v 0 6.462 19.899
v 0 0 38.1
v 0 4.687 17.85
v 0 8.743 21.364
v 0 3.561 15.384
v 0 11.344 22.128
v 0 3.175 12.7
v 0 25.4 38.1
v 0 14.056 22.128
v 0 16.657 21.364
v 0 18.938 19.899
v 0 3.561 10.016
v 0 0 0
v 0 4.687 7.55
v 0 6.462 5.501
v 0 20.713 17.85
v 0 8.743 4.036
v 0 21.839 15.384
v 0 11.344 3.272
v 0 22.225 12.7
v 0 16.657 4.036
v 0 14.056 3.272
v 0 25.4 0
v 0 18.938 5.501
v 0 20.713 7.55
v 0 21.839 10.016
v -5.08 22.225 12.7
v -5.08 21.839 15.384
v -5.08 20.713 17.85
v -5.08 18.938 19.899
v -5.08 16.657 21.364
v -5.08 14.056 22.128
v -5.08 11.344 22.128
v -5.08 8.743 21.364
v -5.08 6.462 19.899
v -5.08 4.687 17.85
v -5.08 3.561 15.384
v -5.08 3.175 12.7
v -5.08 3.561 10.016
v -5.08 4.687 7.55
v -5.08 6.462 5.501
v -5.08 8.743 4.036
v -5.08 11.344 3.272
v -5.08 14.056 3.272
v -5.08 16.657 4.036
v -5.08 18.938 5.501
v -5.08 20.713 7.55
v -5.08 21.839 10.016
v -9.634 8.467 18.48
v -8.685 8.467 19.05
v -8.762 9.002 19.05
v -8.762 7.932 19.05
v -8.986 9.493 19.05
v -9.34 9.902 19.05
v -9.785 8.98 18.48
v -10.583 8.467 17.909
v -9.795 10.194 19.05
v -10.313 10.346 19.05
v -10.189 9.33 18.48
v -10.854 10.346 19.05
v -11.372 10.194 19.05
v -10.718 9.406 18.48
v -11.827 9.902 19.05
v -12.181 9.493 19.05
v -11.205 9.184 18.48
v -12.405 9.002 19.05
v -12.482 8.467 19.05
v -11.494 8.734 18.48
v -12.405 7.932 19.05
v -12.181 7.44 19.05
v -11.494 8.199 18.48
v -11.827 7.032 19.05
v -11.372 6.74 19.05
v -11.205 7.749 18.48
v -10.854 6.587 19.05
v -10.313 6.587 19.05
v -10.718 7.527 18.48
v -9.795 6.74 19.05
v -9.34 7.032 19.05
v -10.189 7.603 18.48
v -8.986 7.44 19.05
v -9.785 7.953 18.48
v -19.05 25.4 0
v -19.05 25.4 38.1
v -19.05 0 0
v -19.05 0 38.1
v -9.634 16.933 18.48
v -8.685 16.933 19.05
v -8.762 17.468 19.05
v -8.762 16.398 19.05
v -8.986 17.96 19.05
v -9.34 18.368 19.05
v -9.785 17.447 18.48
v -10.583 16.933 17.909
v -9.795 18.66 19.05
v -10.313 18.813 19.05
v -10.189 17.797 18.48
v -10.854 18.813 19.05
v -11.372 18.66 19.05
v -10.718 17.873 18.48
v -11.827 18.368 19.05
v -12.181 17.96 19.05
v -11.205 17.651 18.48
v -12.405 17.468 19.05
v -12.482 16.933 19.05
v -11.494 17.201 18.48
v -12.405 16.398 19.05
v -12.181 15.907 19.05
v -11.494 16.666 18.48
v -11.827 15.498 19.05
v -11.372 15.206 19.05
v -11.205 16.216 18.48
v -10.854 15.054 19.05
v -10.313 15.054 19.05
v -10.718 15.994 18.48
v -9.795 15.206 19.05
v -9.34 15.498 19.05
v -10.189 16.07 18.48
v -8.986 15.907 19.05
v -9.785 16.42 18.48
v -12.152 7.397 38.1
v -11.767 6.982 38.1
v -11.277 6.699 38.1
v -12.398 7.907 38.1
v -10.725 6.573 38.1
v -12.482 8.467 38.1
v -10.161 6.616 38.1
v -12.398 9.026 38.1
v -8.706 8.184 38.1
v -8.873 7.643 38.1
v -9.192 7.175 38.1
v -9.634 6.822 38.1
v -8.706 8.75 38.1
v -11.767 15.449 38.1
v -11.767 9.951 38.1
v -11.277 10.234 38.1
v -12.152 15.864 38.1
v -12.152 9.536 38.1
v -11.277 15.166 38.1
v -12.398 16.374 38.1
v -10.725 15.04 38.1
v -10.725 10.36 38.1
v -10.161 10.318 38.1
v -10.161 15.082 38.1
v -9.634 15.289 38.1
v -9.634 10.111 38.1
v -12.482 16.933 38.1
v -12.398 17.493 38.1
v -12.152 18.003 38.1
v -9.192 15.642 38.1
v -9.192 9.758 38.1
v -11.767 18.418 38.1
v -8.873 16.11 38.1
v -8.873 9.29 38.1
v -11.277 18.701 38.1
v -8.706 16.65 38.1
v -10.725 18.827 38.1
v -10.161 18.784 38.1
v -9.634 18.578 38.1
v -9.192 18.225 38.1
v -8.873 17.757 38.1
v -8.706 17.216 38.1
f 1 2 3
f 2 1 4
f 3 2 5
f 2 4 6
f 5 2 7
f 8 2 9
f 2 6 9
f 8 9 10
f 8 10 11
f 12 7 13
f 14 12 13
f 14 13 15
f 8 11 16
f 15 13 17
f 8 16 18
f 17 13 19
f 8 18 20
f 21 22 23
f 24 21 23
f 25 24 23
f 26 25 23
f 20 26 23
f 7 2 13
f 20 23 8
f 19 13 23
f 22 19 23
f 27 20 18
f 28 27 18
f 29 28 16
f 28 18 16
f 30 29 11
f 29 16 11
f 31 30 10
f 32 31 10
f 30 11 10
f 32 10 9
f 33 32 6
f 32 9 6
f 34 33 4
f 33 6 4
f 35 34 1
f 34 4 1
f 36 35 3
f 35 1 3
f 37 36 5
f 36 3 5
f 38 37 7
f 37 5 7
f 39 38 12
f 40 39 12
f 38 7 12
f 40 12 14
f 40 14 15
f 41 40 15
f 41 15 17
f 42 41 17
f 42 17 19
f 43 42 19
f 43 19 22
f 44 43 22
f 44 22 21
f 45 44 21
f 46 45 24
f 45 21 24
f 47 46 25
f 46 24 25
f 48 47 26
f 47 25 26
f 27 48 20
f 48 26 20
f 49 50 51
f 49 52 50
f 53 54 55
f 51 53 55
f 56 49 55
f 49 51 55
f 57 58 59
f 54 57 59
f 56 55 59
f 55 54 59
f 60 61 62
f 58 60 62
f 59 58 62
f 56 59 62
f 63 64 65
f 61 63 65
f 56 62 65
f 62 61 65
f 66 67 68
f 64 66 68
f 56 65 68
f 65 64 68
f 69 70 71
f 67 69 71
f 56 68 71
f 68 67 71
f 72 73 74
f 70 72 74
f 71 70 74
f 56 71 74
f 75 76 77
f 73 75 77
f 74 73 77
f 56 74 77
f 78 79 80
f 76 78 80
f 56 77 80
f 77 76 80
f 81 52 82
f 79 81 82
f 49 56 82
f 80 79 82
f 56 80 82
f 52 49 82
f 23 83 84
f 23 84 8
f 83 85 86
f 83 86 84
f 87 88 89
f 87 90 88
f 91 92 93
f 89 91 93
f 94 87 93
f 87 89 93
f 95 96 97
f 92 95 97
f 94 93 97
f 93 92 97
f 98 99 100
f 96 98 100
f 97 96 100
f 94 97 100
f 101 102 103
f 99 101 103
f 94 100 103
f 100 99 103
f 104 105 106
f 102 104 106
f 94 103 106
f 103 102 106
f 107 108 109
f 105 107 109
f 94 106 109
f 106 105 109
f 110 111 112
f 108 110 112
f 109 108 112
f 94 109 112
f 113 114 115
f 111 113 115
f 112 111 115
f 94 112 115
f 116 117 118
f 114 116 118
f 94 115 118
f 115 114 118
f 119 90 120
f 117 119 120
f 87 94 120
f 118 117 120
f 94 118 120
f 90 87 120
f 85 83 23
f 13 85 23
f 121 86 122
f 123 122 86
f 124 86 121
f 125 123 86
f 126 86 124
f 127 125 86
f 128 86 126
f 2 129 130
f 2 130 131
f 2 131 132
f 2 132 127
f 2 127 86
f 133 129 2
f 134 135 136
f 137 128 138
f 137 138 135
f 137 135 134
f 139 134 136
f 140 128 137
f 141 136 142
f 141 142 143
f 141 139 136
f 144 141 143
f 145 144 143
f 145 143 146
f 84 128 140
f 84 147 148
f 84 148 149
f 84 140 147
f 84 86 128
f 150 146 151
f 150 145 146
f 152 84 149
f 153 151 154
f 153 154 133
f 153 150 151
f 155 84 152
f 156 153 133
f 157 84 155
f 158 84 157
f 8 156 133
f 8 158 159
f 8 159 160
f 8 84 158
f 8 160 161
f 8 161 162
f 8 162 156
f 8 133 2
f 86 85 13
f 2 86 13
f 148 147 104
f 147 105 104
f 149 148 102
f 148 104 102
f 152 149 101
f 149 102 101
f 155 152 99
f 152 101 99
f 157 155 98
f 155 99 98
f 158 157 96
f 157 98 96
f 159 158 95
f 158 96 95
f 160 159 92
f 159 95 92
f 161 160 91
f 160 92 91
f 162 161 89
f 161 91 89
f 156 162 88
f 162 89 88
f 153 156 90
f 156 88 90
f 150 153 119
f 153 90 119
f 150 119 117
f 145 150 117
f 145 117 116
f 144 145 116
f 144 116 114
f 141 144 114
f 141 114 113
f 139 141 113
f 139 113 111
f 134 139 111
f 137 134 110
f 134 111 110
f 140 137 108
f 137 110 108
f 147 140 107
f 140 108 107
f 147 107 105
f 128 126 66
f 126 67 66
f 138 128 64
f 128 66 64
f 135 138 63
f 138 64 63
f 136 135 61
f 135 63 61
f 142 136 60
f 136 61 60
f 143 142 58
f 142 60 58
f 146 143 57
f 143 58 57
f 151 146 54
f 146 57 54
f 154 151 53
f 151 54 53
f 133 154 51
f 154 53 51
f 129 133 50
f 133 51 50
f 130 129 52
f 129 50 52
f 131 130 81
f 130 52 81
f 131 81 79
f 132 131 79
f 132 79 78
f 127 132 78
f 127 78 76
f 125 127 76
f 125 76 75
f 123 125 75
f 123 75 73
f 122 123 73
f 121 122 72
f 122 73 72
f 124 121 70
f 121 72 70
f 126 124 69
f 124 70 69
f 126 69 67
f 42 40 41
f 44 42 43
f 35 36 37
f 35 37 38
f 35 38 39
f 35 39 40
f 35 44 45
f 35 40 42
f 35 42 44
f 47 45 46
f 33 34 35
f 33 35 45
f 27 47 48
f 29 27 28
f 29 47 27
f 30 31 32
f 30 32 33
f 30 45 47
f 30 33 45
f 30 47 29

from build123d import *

# Parameters (mm, degrees)
SKETCH1_W                      = 19.05
SKETCH1_H                      = 25.4
BOSS_EXTRUDE1_DEPTH            = 38.1
TAP_DRILL_FOR_10_24_TAP1_D     = 3.7973
TAP_DRILL_FOR_10_24_TAP1_DEPTH = 19.05
TAP_DRILL_FOR_10_24_TAP1_TIP   = 1.140824014
SKETCH7_R                      = 9.525
CUT_EXTRUDE1_DEPTH             = 5.08


with BuildPart() as part:
    # Sketch1 → Boss-Extrude1 (new body)
    with BuildSketch(Plane.XY):
        with Locations((-9.525, 12.7)):
            Rectangle(SKETCH1_W, SKETCH1_H)
    extrude(amount=BOSS_EXTRUDE1_DEPTH)

    # Tap Drill for #10-24 Tap1
    with Locations(Plane.XY.offset(38.1)):
        with Locations((-10.583333333, 16.933333333), (-10.583333333, 8.466666667)):
            Hole(TAP_DRILL_FOR_10_24_TAP1_D / 2, depth=TAP_DRILL_FOR_10_24_TAP1_DEPTH)
            with Locations((0, 0, -(TAP_DRILL_FOR_10_24_TAP1_DEPTH + TAP_DRILL_FOR_10_24_TAP1_TIP / 2))):  # 118° drill point
                Cone(0, TAP_DRILL_FOR_10_24_TAP1_D / 2, TAP_DRILL_FOR_10_24_TAP1_TIP, mode=Mode.SUBTRACT)

    # Sketch7 → Cut-Extrude1 (cut)
    with BuildSketch(Plane(origin=(0, 0, 0), x_dir=(0, 0, -1), z_dir=(1, 0, 0))):
        with Locations(Location((-12.7, 12.7, 0), (0, 0, 90))):
            Circle(SKETCH7_R)
    extrude(amount=-CUT_EXTRUDE1_DEPTH, mode=Mode.SUBTRACT)


solid = part.part
